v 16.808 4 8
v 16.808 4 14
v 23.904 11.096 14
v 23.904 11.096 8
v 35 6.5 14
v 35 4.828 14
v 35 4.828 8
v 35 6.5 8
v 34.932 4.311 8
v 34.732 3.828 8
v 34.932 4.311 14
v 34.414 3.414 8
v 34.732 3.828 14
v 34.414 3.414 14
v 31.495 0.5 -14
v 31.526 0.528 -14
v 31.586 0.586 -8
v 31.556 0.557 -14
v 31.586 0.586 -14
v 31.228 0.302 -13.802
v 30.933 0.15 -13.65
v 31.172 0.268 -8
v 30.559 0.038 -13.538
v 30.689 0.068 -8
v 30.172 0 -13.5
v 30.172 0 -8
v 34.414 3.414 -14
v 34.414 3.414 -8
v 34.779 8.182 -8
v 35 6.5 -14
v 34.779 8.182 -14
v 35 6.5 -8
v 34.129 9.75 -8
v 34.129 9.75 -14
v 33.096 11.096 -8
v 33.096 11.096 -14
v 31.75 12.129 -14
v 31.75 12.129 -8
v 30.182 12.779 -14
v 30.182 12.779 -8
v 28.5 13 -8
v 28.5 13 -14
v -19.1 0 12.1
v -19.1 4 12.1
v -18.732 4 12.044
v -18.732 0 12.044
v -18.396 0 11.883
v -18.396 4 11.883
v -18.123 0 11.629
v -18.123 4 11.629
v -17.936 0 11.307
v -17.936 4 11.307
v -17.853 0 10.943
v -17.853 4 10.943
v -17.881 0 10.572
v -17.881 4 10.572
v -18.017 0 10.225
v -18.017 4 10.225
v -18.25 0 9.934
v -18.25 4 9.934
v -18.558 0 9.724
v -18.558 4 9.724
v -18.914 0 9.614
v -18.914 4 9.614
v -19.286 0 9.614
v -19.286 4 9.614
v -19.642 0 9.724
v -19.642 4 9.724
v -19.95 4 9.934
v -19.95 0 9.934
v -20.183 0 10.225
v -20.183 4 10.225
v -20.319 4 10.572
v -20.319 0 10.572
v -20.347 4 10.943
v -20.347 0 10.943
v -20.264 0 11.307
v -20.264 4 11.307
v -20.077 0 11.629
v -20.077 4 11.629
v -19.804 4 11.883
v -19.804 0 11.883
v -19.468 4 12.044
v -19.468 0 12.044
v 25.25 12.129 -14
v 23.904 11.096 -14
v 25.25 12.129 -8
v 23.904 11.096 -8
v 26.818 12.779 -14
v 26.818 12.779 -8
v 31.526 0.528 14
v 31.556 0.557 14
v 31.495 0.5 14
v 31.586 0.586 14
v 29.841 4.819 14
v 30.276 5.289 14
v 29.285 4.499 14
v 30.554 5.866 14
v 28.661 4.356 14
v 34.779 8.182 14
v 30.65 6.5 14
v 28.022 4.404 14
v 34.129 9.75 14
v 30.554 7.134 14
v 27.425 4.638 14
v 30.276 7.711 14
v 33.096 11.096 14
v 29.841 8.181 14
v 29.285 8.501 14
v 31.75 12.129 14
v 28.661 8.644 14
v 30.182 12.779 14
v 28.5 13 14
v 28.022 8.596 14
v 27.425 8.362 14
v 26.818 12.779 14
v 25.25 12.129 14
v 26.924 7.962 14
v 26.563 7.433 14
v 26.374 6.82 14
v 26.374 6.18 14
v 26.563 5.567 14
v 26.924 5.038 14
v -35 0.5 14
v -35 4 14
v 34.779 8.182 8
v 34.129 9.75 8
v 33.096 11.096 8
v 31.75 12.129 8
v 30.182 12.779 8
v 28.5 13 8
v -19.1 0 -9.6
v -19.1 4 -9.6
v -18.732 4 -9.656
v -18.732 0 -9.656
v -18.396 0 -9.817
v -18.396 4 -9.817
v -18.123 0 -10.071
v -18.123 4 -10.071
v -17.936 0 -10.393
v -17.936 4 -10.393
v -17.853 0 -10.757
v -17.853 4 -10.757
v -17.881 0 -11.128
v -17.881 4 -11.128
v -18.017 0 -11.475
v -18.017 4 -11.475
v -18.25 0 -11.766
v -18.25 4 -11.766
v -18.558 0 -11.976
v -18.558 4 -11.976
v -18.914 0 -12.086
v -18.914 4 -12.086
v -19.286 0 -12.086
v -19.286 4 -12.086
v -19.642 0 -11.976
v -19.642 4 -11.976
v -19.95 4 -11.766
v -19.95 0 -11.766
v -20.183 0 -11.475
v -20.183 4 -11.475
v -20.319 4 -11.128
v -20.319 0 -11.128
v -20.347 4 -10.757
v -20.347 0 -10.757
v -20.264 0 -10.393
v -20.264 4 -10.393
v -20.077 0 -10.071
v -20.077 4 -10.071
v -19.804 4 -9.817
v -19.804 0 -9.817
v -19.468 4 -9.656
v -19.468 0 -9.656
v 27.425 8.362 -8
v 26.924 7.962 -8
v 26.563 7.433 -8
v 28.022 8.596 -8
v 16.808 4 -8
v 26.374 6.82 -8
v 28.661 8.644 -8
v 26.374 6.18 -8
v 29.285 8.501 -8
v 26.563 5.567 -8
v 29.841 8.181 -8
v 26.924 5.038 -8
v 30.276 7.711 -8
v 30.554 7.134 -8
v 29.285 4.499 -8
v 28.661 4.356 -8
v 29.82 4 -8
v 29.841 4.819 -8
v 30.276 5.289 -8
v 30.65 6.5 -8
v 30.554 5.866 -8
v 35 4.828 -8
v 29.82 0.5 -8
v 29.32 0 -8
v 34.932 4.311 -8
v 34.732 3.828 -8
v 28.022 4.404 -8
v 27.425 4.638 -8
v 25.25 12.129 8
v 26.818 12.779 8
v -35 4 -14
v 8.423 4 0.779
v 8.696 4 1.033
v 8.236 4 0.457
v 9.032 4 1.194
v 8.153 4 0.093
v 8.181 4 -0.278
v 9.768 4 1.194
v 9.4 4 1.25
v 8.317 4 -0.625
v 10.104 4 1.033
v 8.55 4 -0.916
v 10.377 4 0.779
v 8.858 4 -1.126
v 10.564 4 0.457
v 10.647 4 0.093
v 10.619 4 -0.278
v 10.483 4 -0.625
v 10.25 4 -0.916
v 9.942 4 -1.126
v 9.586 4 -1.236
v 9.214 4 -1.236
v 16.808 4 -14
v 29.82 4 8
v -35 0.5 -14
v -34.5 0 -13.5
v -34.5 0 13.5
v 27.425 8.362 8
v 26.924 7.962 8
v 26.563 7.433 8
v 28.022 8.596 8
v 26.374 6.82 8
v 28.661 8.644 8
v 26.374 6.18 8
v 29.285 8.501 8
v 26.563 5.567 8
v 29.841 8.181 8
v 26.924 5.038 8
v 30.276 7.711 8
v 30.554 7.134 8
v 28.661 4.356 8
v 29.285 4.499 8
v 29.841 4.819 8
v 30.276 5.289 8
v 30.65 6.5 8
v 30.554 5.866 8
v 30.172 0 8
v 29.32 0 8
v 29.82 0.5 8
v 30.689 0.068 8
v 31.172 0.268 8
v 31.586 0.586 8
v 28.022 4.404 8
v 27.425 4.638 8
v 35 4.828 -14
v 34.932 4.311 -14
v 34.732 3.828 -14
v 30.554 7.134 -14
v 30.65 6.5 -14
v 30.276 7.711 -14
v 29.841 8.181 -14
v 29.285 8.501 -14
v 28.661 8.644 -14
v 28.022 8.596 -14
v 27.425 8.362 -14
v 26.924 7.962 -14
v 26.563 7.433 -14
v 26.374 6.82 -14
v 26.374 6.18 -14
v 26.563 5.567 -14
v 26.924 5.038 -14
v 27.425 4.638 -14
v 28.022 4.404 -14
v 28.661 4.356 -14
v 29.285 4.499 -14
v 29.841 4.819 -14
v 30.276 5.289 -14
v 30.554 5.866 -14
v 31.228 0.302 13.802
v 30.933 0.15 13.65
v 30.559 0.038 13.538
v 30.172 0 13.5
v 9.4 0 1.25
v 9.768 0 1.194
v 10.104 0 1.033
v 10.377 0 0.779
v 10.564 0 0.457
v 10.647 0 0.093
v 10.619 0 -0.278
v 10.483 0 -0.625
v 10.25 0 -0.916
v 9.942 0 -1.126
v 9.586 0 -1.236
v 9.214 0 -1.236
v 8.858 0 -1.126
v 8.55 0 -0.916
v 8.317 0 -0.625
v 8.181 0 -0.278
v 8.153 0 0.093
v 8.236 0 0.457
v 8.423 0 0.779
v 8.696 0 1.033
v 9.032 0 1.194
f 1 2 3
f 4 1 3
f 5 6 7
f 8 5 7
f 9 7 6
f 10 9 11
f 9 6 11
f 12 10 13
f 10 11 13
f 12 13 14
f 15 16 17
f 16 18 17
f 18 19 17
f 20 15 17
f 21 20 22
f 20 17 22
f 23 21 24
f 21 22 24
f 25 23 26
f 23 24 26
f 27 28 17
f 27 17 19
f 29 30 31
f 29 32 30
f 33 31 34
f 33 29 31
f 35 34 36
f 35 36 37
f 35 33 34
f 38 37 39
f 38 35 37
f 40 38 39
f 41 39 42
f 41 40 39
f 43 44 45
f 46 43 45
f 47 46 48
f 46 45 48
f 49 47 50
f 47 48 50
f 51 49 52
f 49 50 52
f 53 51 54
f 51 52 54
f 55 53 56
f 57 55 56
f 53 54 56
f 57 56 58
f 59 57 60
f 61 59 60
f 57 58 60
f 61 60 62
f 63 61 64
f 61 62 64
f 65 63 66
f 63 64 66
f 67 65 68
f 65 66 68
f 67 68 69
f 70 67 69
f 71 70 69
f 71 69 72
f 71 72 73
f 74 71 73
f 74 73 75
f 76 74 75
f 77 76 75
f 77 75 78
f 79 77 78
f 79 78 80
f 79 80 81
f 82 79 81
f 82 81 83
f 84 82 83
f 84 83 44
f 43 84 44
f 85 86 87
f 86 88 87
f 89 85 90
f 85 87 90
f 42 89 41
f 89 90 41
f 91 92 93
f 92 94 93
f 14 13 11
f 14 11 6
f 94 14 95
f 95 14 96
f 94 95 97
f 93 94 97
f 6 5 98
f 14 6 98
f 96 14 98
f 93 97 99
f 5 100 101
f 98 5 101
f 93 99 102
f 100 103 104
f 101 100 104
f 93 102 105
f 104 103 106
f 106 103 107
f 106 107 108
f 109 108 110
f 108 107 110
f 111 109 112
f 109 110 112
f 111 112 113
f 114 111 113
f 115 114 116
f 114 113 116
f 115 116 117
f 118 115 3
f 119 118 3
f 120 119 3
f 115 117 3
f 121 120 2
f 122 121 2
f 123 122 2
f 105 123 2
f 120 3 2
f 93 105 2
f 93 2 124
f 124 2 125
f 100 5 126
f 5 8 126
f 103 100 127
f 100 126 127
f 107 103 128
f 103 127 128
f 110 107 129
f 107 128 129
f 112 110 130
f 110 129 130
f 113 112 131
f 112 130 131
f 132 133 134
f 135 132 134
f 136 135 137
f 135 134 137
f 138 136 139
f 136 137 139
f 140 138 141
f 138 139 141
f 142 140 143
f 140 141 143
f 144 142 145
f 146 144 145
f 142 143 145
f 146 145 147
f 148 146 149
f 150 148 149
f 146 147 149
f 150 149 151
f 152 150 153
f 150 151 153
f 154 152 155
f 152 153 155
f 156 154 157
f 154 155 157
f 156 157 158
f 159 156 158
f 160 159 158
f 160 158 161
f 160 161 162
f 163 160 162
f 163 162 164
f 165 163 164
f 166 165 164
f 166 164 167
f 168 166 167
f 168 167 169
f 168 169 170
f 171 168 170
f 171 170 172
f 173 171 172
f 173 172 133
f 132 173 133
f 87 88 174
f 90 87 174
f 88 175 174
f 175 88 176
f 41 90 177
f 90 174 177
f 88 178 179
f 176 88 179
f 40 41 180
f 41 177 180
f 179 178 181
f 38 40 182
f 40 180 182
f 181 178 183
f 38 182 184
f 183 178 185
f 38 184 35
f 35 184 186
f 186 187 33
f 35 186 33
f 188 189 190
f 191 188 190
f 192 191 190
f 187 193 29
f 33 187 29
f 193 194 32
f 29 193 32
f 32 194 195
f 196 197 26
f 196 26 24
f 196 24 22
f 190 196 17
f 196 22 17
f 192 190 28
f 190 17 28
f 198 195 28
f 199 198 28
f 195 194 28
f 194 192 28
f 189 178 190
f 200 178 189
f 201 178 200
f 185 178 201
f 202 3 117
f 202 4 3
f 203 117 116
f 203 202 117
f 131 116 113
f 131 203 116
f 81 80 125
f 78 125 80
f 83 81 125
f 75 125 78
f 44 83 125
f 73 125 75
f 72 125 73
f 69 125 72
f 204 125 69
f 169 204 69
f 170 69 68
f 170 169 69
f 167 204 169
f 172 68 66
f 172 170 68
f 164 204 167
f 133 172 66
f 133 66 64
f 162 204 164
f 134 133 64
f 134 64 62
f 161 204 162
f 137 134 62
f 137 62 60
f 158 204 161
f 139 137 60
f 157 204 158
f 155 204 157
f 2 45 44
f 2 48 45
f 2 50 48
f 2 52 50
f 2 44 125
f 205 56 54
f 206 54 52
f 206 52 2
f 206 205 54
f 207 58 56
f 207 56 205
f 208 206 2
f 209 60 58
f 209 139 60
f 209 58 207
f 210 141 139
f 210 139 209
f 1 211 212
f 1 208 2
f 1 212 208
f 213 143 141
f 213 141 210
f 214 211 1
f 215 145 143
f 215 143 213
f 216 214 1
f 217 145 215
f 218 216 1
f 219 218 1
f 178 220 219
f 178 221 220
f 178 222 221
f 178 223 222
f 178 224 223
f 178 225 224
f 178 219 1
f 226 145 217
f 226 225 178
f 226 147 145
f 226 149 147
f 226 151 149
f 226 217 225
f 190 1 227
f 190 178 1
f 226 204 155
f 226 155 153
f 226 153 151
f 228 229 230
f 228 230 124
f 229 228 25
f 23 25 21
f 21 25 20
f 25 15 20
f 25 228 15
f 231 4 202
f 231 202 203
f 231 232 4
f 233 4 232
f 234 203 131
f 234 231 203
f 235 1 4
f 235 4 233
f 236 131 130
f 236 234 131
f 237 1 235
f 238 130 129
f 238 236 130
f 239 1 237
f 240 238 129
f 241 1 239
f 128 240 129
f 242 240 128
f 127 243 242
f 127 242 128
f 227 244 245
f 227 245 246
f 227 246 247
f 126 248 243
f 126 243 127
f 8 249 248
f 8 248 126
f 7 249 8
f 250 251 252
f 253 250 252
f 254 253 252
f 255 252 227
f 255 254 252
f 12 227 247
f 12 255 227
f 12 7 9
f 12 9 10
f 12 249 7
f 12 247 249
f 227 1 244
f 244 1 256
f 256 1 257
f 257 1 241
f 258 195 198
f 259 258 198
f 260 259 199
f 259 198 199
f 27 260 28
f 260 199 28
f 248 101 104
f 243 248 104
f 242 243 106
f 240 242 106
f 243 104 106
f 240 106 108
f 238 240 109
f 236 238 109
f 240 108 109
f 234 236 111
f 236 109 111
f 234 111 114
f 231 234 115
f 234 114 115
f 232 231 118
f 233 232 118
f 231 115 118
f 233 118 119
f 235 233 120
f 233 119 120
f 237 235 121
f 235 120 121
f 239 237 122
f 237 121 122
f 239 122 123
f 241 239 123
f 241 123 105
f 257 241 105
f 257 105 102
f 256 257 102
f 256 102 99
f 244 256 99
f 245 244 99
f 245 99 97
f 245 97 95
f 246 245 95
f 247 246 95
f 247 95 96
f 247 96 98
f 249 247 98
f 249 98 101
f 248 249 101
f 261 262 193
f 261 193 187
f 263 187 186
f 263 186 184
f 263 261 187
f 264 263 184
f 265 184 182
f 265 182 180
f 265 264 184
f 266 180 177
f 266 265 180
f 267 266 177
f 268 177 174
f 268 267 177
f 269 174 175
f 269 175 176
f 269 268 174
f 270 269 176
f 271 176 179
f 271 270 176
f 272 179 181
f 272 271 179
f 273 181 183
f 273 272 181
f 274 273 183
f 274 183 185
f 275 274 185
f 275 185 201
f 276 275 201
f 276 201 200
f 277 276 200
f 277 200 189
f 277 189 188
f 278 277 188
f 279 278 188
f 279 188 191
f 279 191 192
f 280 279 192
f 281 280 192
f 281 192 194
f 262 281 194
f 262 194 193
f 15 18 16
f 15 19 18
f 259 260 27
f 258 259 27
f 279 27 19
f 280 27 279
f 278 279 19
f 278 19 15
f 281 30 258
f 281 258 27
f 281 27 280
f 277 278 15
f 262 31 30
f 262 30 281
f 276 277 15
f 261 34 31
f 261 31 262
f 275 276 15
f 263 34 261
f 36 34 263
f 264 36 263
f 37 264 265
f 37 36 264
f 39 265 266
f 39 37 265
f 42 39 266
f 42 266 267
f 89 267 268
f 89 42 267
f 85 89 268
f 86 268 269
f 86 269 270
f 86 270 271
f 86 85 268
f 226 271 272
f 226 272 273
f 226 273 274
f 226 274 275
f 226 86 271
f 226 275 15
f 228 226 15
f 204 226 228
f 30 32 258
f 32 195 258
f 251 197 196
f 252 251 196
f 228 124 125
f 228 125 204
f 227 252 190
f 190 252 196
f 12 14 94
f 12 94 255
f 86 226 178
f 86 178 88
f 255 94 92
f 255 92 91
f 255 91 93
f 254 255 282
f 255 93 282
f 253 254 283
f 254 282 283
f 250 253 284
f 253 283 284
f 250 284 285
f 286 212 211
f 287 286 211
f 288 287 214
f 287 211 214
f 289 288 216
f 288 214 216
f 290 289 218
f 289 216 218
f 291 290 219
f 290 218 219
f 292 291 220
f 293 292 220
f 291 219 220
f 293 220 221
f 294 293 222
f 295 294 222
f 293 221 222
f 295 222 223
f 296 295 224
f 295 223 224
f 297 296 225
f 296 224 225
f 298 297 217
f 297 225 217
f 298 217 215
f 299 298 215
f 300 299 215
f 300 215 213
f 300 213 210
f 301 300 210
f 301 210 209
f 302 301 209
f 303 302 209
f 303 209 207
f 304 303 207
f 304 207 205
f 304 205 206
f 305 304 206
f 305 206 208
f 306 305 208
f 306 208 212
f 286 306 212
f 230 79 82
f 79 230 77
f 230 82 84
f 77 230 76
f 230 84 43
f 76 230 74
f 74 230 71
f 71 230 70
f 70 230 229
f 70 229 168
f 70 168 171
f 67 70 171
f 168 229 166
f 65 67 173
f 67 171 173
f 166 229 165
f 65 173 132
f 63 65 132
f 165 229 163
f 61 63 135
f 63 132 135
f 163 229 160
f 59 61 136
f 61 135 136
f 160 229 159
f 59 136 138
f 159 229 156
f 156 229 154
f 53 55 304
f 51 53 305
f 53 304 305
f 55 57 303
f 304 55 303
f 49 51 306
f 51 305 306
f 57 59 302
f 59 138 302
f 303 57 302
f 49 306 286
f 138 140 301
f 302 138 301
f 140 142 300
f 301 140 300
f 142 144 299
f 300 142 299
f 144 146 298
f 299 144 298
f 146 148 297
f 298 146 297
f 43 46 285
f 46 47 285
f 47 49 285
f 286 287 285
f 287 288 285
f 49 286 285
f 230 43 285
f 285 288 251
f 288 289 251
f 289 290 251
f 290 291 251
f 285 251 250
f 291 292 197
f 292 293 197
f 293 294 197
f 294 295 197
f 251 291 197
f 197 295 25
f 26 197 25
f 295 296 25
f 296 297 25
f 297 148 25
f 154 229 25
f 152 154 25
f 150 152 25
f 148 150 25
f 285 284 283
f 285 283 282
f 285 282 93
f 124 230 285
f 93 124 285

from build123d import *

# Parameters (mm, degrees)
SKIZZE1_W                           = 70
SKIZZE1_H                           = 28
AUFSATZ_LINEAR_AUSTRAGEN1_DEPTH     = 4
SKIZZE2_R                           = 2.15
AUFSATZ_LINEAR_AUSTRAGEN2_DEPTH     = 6
VERRUNDUNG1_R                       = 6.5
VERRUNDUNG1_OF_SPIEGELN1_R          = 6.5
FASE1_SIZE                          = 4
VERRUNDUNG2_R                       = 2
SCHNITT_LINEAR_START                = -5
SCHNITT_LINEAR_AUSTRAGEN1_OUTLINE_W = 6.179640558
SCHNITT_LINEAR_AUSTRAGEN1_OUTLINE_H = 16
SCHNITT_LINEAR_AUSTRAGEN1_DEPTH     = 5.828427125
SCHNITT_LINEAR_AUSTRAGEN2_REACH     = 40.756
SKIZZE4_R                           = 1.25
FASE2_SIZE                          = 0.5


with BuildPart() as part:
    # Skizze1 → Aufsatz-Linear austragen1 (new body)
    with BuildSketch(Plane(origin=(0, 0, 0), x_dir=(1, 0, 0), z_dir=(0, 1, 0))):
        Rectangle(SKIZZE1_W, SKIZZE1_H)
    extrude(amount=AUFSATZ_LINEAR_AUSTRAGEN1_DEPTH)

    # Skizze2 → Aufsatz-Linear austragen2 (add)
    with BuildSketch(Plane.XY.offset(14)):
        Polygon((16.807611845, 4), (25.807611845, 13), (35, 13), (35, 4), align=None)
        with Locations((28.5, 6.5)):
            Circle(SKIZZE2_R, mode=Mode.SUBTRACT)
    aufsatz_linear_austragen2 = extrude(amount=-AUFSATZ_LINEAR_AUSTRAGEN2_DEPTH)

    # Verrundung1
    verrundung1_edges = [part.edges().sort_by_distance(p)[0] for p in [
        (25.807611845, 13, 11),
        (35, 13, 11),
    ]]
    fillet(verrundung1_edges, radius=VERRUNDUNG1_R - 0.0001)  # a hair under: the kernel refuses the full size

    # Spiegeln1: Aufsatz-Linear austragen2 across plane
    add(aufsatz_linear_austragen2.mirror(Plane.XY))

    # Verrundung1 of Spiegeln1
    verrundung1_of_spiegeln1_edges = [part.edges().sort_by_distance(p)[0] for p in [
        (25.807611845, 13, -11),
        (35, 13, -11),
    ]]
    fillet(verrundung1_of_spiegeln1_edges, radius=VERRUNDUNG1_OF_SPIEGELN1_R - 0.0001)  # a hair under: the kernel refuses the full size

    # Fase1
    fase1_edges = [part.edges().sort_by_distance(p)[0] for p in [
        (35, 0, 0),
    ]]
    chamfer(fase1_edges, length=FASE1_SIZE - 0.0001)  # a hair under: the kernel refuses the full size

    # Verrundung2
    # the kernel refuses this fillet: 2 mm, written as the material it takes off along each edge
    with BuildSketch(Plane(origin=(31.0001, 0, 16.071067812), x_dir=(0.7071067811865477, 0.7071067811865474, 0), z_dir=(0, 0, -1)), Plane(origin=(35, 3.9999, 16.071067812), x_dir=(0, 1, 0), z_dir=(0, 0, -1))) as verrundung2_piece_1:
        with BuildLine():
            CenterArc((VERRUNDUNG2_R * 0.414213562373, -VERRUNDUNG2_R), VERRUNDUNG2_R, 90, 45)
            Line((-VERRUNDUNG2_R * 0.292893218813, -VERRUNDUNG2_R * 0.292893218813), (0, 0))
            Line((0, 0), (VERRUNDUNG2_R * 0.414213562373, 0))
        make_face()
    extrude(amount=32.142135624, mode=Mode.SUBTRACT)

    # Schnitt-Linear austragen1: read off the stored shape, not the designer's step
    # Schnitt-Linear austragen1 outline → Schnitt-Linear austragen1 (cut)
    with BuildSketch(Plane(origin=(0, 4, 0), x_dir=(1, 0, 0), z_dir=(0, 1, 0)).offset(SCHNITT_LINEAR_START)):
        with Locations((32.910179721, 0)):
            Rectangle(SCHNITT_LINEAR_AUSTRAGEN1_OUTLINE_W, SCHNITT_LINEAR_AUSTRAGEN1_OUTLINE_H)
    extrude(amount=SCHNITT_LINEAR_AUSTRAGEN1_DEPTH, mode=Mode.SUBTRACT)

    # Skizze4 → Schnitt-Linear austragen2 (cut, up to next)
    with BuildSketch(Plane(origin=(0, 4, 0), x_dir=(1, 0, 0), z_dir=(0, 1, 0)), mode=Mode.PRIVATE) as schnitt_linear_austragen2_sk1:
        with Locations(Location((-19.1, -10.85, 0), (0, 0, 270))):
            Circle(SKIZZE4_R)
    schnitt_linear_austragen2_tool1 = extrude(schnitt_linear_austragen2_sk1.sketch, amount=-SCHNITT_LINEAR_AUSTRAGEN2_REACH, mode=Mode.PRIVATE) & part.part
    # Skizze4 → Schnitt-Linear austragen2 (cut, up to next)
    with BuildSketch(Plane(origin=(0, 4, 0), x_dir=(1, 0, 0), z_dir=(0, 1, 0)), mode=Mode.PRIVATE) as schnitt_linear_austragen2_sk2:
        with Locations(Location((9.4, 0, 0), (0, 0, 270))):
            Circle(SKIZZE4_R)
    schnitt_linear_austragen2_tool2 = extrude(schnitt_linear_austragen2_sk2.sketch, amount=-SCHNITT_LINEAR_AUSTRAGEN2_REACH, mode=Mode.PRIVATE) & part.part
    # Skizze4 → Schnitt-Linear austragen2 (cut, up to next)
    with BuildSketch(Plane(origin=(0, 4, 0), x_dir=(1, 0, 0), z_dir=(0, 1, 0)), mode=Mode.PRIVATE) as schnitt_linear_austragen2_sk3:
        with Locations(Location((-19.1, 10.85, 0), (0, 0, 270))):
            Circle(SKIZZE4_R)
    schnitt_linear_austragen2_tool3 = extrude(schnitt_linear_austragen2_sk3.sketch, amount=-SCHNITT_LINEAR_AUSTRAGEN2_REACH, mode=Mode.PRIVATE) & part.part
    add(schnitt_linear_austragen2_tool1.solids().sort_by_distance((-19.1, 4, 10.85))[0], mode=Mode.SUBTRACT)
    add(schnitt_linear_austragen2_tool2.solids().sort_by_distance((9.4, 4, 0))[0], mode=Mode.SUBTRACT)
    add(schnitt_linear_austragen2_tool3.solids().sort_by_distance((-19.1, 4, -10.85))[0], mode=Mode.SUBTRACT)

    # Fase2
    # the kernel refuses this chamfer: 0.5 mm, written as the material it takes off along each edge
    with BuildSketch(Plane(origin=(-36.285841494, 0, 14), x_dir=(0, 0, -1), z_dir=(1, 0, 0))) as fase2_piece_1:
        Polygon((FASE2_SIZE, 0), (0, FASE2_SIZE), (0, 0), align=None)
    extrude(amount=68.643444909, mode=Mode.SUBTRACT)
    with BuildSketch(Plane(origin=(-35, 0, -15.285841494), x_dir=(1, 0, 0), z_dir=(0, 0, 1))) as fase2_piece_2:
        Polygon((FASE2_SIZE, 0), (0, FASE2_SIZE), (0, 0), align=None)
    extrude(amount=30.571682988, mode=Mode.SUBTRACT)
    with BuildSketch(Plane(origin=(32.357603415, 0, -14), x_dir=(0, 1, 0), z_dir=(-1, 0, 0))) as fase2_piece_3:
        Polygon((FASE2_SIZE, 0), (0, -FASE2_SIZE), (0, 0), align=None)
    extrude(amount=68.643444909, mode=Mode.SUBTRACT)
    with BuildSketch(Plane(origin=(29.820359442, 0, 8), x_dir=(-1, 0, 0), z_dir=(0, 0, -1))) as fase2_piece_4:
        Polygon((FASE2_SIZE, 0), (0, FASE2_SIZE), (0, 0), align=None)
    extrude(amount=16, mode=Mode.SUBTRACT)


solid = part.part
